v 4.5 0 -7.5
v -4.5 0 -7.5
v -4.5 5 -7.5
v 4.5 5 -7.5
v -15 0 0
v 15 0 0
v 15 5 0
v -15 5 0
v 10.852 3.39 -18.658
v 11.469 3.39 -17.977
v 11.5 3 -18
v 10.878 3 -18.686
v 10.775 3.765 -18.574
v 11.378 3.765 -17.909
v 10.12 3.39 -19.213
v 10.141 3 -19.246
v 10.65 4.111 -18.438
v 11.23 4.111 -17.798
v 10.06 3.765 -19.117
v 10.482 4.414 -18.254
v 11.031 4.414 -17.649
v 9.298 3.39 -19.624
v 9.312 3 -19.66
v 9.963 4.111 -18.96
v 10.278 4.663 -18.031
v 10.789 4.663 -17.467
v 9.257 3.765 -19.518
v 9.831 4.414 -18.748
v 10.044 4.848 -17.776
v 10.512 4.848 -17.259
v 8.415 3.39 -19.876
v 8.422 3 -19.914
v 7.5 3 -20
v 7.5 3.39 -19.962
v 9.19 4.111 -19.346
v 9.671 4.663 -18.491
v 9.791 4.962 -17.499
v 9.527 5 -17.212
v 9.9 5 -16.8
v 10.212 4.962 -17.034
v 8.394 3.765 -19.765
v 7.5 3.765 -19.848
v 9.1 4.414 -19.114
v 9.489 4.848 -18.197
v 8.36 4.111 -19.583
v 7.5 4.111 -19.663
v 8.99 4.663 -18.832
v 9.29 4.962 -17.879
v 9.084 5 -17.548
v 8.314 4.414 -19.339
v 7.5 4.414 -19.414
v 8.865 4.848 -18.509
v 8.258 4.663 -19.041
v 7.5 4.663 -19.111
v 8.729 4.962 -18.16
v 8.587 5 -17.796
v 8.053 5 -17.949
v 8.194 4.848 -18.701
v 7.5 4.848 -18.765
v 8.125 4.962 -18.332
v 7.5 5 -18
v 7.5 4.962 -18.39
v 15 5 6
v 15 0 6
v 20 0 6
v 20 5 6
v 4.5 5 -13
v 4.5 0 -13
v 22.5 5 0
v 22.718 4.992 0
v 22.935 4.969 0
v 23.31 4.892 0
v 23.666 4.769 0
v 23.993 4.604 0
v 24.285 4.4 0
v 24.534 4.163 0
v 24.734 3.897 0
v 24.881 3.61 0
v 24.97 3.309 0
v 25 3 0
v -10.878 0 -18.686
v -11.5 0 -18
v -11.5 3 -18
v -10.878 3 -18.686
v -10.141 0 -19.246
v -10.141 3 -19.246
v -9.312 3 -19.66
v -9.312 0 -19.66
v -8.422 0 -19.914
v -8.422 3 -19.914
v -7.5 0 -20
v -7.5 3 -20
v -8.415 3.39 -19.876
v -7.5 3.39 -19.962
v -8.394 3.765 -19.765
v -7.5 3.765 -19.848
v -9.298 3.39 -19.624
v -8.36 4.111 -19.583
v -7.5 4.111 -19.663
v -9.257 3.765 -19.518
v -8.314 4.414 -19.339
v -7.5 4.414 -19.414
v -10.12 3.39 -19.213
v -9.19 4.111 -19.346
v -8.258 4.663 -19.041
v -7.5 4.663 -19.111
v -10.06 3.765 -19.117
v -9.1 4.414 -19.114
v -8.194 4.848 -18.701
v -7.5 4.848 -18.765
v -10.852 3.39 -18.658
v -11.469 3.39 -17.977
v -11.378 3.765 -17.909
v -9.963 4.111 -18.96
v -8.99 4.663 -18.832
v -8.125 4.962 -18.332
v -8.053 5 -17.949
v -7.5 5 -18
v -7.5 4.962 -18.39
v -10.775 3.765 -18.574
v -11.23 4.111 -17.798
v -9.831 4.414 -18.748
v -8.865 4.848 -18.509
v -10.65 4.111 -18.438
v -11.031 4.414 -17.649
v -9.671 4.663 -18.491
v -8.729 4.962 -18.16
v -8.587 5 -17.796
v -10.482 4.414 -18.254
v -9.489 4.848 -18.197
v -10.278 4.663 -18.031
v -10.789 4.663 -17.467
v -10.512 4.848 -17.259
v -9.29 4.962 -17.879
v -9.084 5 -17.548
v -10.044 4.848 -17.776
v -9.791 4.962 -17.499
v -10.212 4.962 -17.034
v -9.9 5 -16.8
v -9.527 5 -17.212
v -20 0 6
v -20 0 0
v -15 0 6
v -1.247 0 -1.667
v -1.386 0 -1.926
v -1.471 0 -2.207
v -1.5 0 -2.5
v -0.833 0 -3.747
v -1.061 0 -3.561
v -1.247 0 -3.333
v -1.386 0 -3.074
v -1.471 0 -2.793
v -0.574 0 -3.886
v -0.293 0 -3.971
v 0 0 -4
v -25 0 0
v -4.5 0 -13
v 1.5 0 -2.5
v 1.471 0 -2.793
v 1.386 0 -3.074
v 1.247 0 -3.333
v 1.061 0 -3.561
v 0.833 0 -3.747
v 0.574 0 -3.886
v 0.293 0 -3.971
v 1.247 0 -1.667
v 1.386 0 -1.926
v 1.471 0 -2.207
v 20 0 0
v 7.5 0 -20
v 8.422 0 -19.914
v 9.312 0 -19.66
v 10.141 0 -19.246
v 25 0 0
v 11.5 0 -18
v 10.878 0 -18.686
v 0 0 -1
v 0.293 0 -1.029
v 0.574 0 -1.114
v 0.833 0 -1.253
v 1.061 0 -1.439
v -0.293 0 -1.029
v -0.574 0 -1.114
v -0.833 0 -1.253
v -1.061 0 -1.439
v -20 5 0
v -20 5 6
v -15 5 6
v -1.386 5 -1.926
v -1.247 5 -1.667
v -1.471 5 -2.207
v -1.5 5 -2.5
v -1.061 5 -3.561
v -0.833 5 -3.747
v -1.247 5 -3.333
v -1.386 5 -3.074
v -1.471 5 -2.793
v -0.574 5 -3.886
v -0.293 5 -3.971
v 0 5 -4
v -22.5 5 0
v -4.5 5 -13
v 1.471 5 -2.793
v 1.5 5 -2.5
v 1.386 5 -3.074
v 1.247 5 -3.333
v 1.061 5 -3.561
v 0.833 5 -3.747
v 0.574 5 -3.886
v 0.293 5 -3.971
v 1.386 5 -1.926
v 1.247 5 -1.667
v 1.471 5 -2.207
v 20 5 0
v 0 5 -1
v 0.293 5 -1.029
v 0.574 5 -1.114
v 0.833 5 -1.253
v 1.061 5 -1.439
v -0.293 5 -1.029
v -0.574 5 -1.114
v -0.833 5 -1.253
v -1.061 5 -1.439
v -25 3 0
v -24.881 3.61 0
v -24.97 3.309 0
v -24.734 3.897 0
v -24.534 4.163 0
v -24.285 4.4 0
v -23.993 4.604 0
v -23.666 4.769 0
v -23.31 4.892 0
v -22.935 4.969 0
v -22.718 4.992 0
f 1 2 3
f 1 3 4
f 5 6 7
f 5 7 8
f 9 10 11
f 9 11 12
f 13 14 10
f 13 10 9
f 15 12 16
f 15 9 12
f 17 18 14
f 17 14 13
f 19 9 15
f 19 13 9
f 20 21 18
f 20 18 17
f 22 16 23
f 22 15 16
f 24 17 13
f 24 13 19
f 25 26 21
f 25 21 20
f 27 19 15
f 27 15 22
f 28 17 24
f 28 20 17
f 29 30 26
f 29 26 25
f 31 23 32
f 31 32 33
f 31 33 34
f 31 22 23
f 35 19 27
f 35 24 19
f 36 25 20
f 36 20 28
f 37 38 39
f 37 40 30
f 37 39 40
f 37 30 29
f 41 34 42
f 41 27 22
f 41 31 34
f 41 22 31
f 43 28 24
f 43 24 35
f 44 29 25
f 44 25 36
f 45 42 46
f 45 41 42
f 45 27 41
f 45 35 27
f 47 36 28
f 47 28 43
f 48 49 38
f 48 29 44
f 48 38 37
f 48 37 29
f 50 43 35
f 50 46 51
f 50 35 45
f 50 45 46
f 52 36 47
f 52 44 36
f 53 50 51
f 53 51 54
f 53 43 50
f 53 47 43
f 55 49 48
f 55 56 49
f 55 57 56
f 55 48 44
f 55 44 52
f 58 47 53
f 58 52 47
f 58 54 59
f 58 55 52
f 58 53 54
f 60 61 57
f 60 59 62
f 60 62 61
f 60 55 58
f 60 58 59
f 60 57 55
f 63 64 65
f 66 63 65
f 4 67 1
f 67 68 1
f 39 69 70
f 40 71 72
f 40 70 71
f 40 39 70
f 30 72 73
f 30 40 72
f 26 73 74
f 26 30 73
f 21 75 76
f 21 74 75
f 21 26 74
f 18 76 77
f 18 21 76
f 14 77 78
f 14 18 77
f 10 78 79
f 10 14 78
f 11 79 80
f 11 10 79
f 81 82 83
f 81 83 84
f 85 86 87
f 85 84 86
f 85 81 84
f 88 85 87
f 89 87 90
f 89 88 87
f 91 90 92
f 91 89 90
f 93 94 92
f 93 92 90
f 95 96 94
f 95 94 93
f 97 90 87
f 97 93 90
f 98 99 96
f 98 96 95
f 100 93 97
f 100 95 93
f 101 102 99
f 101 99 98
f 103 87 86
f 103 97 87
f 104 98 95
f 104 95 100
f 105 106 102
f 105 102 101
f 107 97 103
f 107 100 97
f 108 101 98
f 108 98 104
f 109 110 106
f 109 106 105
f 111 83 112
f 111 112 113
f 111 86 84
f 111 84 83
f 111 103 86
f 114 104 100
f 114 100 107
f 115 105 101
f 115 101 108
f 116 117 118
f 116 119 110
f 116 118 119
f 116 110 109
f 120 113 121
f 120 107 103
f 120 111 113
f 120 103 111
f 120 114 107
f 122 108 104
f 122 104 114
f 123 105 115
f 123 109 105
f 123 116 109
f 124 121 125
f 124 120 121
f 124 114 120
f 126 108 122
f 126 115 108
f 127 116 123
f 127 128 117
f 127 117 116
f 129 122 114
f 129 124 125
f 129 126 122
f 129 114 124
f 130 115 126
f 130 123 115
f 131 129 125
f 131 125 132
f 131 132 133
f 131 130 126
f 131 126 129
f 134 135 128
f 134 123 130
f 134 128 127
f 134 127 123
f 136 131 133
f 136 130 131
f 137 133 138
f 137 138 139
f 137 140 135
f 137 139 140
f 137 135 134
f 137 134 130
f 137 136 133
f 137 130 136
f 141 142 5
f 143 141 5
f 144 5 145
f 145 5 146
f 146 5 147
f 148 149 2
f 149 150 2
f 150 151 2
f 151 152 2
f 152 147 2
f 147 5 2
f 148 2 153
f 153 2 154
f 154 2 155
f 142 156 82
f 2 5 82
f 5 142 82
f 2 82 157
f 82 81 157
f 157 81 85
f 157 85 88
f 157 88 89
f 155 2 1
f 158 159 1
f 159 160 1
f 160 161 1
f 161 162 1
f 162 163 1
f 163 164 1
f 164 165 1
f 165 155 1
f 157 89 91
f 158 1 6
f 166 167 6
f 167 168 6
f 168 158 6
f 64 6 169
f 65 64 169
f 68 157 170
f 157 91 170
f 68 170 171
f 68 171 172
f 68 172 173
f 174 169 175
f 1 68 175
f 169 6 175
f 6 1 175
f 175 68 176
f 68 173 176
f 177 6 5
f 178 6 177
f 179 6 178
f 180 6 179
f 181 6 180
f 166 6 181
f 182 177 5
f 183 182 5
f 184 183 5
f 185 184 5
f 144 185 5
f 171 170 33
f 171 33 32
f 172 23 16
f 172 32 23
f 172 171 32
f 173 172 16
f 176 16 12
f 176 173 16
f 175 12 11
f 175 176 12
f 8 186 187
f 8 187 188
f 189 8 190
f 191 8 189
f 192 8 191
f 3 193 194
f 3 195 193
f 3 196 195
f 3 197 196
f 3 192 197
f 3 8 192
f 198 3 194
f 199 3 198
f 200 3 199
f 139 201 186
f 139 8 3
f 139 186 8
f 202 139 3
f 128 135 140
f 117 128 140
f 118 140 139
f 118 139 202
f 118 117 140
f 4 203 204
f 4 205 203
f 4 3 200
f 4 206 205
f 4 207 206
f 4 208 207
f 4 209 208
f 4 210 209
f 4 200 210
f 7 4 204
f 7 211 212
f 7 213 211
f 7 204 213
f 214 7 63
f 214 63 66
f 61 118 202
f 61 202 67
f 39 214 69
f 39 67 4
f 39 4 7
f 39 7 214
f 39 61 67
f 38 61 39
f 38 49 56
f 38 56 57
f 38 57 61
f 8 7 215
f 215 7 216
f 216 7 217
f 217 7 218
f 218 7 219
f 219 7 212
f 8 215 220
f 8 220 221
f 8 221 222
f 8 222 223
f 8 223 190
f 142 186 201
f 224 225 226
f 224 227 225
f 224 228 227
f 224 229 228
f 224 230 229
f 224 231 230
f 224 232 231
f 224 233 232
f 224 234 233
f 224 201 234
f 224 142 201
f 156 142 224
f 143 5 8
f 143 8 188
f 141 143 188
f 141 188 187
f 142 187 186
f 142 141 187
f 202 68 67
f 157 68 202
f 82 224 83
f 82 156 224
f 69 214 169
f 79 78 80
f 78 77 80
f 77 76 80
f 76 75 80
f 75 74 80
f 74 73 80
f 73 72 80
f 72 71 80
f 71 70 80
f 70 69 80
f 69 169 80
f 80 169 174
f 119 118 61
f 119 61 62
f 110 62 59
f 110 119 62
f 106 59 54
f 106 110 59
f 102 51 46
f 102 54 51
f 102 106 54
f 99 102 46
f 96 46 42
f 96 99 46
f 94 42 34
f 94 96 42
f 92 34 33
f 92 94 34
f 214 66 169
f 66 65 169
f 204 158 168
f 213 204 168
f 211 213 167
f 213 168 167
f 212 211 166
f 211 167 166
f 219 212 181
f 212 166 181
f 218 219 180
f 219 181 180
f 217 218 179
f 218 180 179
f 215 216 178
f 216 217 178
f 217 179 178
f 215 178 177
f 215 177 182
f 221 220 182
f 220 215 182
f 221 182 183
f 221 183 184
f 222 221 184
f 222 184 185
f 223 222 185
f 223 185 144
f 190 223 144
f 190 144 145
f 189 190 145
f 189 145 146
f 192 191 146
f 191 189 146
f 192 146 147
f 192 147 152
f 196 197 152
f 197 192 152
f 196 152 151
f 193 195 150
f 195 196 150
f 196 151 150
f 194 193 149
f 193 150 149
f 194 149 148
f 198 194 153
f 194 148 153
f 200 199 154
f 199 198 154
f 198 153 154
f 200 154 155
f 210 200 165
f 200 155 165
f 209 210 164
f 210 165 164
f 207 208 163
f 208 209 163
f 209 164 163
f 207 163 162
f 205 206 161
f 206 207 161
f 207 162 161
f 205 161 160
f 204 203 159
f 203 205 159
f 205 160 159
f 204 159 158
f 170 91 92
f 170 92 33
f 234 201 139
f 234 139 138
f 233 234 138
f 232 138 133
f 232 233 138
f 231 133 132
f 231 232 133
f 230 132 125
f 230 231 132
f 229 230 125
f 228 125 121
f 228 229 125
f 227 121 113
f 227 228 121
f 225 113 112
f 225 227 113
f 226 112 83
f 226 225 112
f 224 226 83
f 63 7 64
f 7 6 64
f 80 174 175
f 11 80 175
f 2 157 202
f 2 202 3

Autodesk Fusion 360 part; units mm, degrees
sketch "Sketch1" plane through (0, 0, 0) normal (0, 1, 0) x (1, 0, 0)
  line L0 (0, 0) -> (-15, 0)
  line L1 (-15, 0) -> (-15, -6)
  line L2 (-15, -6) -> (-20, -6)
  line L3 (-20, -6) -> (-20, 0)
  line L4 (-20, 0) -> (-25, 0)
  line L5 (-7.5, 20) -> (0, 20)
  line L6 (0, 0) -> (15, 0)
  line L7 (15, 0) -> (15, -6)
  line L8 (15, -6) -> (20, -6)
  line L9 (20, -6) -> (20, 0)
  line L10 (20, 0) -> (25, 0)
  line L11 (7.5, 20) -> (0, 20)
  line L12 (-25, 0) -> (-11.5, 18)
  line L13 (25, 0) -> (11.5, 18)
  arc A0 (-7.5, 20) -> (-11.5, 18) centre (-7.5, 15) ccw
  arc A1 (11.5, 18) -> (7.5, 20) centre (7.5, 15) ccw
  line L14 (0, 13) -> (-4.5, 13)
  line L15 (-4.5, 13) -> (-4.5, 7.5)
  line L16 (-4.5, 7.5) -> (4.5, 7.5)
  line L17 (0, 13) -> (4.5, 13)
  line L18 (4.5, 13) -> (4.5, 7.5)
  circle A2 centre (0, 2.5) radius 1.5
  dimension "d1" = 5
  dimension "d6" = 2.5
  dimension "d7" = 3
extrude "Extrude1" add sketch "Sketch1" along normal blind 5
sketch "Sketch2" plane through (0, 5, 0) normal (0, 1, 0) x (-1, 0, 0)
  line L0 (4.5, -13) -> (-4.5, -13)
  line L1 (-4.5, -13) -> (-4.5, -7.5)
  line L2 (-4.5, -7.5) -> (4.5, -7.5)
  line L3 (4.5, -7.5) -> (4.5, -13)
  circle A0 centre (0, -2.5) radius 1.5
  line L4 (15, 0) -> (-15, 0)
  line L5 (-15, 0) -> (-15, 6)
  line L6 (-15, 6) -> (-20, 6)
  line L7 (-20, 6) -> (-20, 0)
  line L8 (-20, 0) -> (-25, 0)
  line L9 (-25, 0) -> (-11.5, -18)
  arc A1 (-11.5, -18) -> (-7.5, -20) centre (-7.5, -15) ccw
  line L10 (-7.5, -20) -> (7.5, -20)
  arc A2 (7.5, -20) -> (11.5, -18) centre (7.5, -15) ccw
  line L11 (11.5, -18) -> (25, 0)
  line L12 (25, 0) -> (20, 0)
  line L13 (20, 0) -> (20, 6)
  line L14 (20, 6) -> (15, 6)
  line L15 (15, 6) -> (15, 0)
fillet "Fillet1" radius 2 5 edges at (18.25, 5, -9) (9.7361, 5, -19.4721) (0, 5, -20) (-9.7361, 5, -19.4721) (-18.25, 5, -9)
